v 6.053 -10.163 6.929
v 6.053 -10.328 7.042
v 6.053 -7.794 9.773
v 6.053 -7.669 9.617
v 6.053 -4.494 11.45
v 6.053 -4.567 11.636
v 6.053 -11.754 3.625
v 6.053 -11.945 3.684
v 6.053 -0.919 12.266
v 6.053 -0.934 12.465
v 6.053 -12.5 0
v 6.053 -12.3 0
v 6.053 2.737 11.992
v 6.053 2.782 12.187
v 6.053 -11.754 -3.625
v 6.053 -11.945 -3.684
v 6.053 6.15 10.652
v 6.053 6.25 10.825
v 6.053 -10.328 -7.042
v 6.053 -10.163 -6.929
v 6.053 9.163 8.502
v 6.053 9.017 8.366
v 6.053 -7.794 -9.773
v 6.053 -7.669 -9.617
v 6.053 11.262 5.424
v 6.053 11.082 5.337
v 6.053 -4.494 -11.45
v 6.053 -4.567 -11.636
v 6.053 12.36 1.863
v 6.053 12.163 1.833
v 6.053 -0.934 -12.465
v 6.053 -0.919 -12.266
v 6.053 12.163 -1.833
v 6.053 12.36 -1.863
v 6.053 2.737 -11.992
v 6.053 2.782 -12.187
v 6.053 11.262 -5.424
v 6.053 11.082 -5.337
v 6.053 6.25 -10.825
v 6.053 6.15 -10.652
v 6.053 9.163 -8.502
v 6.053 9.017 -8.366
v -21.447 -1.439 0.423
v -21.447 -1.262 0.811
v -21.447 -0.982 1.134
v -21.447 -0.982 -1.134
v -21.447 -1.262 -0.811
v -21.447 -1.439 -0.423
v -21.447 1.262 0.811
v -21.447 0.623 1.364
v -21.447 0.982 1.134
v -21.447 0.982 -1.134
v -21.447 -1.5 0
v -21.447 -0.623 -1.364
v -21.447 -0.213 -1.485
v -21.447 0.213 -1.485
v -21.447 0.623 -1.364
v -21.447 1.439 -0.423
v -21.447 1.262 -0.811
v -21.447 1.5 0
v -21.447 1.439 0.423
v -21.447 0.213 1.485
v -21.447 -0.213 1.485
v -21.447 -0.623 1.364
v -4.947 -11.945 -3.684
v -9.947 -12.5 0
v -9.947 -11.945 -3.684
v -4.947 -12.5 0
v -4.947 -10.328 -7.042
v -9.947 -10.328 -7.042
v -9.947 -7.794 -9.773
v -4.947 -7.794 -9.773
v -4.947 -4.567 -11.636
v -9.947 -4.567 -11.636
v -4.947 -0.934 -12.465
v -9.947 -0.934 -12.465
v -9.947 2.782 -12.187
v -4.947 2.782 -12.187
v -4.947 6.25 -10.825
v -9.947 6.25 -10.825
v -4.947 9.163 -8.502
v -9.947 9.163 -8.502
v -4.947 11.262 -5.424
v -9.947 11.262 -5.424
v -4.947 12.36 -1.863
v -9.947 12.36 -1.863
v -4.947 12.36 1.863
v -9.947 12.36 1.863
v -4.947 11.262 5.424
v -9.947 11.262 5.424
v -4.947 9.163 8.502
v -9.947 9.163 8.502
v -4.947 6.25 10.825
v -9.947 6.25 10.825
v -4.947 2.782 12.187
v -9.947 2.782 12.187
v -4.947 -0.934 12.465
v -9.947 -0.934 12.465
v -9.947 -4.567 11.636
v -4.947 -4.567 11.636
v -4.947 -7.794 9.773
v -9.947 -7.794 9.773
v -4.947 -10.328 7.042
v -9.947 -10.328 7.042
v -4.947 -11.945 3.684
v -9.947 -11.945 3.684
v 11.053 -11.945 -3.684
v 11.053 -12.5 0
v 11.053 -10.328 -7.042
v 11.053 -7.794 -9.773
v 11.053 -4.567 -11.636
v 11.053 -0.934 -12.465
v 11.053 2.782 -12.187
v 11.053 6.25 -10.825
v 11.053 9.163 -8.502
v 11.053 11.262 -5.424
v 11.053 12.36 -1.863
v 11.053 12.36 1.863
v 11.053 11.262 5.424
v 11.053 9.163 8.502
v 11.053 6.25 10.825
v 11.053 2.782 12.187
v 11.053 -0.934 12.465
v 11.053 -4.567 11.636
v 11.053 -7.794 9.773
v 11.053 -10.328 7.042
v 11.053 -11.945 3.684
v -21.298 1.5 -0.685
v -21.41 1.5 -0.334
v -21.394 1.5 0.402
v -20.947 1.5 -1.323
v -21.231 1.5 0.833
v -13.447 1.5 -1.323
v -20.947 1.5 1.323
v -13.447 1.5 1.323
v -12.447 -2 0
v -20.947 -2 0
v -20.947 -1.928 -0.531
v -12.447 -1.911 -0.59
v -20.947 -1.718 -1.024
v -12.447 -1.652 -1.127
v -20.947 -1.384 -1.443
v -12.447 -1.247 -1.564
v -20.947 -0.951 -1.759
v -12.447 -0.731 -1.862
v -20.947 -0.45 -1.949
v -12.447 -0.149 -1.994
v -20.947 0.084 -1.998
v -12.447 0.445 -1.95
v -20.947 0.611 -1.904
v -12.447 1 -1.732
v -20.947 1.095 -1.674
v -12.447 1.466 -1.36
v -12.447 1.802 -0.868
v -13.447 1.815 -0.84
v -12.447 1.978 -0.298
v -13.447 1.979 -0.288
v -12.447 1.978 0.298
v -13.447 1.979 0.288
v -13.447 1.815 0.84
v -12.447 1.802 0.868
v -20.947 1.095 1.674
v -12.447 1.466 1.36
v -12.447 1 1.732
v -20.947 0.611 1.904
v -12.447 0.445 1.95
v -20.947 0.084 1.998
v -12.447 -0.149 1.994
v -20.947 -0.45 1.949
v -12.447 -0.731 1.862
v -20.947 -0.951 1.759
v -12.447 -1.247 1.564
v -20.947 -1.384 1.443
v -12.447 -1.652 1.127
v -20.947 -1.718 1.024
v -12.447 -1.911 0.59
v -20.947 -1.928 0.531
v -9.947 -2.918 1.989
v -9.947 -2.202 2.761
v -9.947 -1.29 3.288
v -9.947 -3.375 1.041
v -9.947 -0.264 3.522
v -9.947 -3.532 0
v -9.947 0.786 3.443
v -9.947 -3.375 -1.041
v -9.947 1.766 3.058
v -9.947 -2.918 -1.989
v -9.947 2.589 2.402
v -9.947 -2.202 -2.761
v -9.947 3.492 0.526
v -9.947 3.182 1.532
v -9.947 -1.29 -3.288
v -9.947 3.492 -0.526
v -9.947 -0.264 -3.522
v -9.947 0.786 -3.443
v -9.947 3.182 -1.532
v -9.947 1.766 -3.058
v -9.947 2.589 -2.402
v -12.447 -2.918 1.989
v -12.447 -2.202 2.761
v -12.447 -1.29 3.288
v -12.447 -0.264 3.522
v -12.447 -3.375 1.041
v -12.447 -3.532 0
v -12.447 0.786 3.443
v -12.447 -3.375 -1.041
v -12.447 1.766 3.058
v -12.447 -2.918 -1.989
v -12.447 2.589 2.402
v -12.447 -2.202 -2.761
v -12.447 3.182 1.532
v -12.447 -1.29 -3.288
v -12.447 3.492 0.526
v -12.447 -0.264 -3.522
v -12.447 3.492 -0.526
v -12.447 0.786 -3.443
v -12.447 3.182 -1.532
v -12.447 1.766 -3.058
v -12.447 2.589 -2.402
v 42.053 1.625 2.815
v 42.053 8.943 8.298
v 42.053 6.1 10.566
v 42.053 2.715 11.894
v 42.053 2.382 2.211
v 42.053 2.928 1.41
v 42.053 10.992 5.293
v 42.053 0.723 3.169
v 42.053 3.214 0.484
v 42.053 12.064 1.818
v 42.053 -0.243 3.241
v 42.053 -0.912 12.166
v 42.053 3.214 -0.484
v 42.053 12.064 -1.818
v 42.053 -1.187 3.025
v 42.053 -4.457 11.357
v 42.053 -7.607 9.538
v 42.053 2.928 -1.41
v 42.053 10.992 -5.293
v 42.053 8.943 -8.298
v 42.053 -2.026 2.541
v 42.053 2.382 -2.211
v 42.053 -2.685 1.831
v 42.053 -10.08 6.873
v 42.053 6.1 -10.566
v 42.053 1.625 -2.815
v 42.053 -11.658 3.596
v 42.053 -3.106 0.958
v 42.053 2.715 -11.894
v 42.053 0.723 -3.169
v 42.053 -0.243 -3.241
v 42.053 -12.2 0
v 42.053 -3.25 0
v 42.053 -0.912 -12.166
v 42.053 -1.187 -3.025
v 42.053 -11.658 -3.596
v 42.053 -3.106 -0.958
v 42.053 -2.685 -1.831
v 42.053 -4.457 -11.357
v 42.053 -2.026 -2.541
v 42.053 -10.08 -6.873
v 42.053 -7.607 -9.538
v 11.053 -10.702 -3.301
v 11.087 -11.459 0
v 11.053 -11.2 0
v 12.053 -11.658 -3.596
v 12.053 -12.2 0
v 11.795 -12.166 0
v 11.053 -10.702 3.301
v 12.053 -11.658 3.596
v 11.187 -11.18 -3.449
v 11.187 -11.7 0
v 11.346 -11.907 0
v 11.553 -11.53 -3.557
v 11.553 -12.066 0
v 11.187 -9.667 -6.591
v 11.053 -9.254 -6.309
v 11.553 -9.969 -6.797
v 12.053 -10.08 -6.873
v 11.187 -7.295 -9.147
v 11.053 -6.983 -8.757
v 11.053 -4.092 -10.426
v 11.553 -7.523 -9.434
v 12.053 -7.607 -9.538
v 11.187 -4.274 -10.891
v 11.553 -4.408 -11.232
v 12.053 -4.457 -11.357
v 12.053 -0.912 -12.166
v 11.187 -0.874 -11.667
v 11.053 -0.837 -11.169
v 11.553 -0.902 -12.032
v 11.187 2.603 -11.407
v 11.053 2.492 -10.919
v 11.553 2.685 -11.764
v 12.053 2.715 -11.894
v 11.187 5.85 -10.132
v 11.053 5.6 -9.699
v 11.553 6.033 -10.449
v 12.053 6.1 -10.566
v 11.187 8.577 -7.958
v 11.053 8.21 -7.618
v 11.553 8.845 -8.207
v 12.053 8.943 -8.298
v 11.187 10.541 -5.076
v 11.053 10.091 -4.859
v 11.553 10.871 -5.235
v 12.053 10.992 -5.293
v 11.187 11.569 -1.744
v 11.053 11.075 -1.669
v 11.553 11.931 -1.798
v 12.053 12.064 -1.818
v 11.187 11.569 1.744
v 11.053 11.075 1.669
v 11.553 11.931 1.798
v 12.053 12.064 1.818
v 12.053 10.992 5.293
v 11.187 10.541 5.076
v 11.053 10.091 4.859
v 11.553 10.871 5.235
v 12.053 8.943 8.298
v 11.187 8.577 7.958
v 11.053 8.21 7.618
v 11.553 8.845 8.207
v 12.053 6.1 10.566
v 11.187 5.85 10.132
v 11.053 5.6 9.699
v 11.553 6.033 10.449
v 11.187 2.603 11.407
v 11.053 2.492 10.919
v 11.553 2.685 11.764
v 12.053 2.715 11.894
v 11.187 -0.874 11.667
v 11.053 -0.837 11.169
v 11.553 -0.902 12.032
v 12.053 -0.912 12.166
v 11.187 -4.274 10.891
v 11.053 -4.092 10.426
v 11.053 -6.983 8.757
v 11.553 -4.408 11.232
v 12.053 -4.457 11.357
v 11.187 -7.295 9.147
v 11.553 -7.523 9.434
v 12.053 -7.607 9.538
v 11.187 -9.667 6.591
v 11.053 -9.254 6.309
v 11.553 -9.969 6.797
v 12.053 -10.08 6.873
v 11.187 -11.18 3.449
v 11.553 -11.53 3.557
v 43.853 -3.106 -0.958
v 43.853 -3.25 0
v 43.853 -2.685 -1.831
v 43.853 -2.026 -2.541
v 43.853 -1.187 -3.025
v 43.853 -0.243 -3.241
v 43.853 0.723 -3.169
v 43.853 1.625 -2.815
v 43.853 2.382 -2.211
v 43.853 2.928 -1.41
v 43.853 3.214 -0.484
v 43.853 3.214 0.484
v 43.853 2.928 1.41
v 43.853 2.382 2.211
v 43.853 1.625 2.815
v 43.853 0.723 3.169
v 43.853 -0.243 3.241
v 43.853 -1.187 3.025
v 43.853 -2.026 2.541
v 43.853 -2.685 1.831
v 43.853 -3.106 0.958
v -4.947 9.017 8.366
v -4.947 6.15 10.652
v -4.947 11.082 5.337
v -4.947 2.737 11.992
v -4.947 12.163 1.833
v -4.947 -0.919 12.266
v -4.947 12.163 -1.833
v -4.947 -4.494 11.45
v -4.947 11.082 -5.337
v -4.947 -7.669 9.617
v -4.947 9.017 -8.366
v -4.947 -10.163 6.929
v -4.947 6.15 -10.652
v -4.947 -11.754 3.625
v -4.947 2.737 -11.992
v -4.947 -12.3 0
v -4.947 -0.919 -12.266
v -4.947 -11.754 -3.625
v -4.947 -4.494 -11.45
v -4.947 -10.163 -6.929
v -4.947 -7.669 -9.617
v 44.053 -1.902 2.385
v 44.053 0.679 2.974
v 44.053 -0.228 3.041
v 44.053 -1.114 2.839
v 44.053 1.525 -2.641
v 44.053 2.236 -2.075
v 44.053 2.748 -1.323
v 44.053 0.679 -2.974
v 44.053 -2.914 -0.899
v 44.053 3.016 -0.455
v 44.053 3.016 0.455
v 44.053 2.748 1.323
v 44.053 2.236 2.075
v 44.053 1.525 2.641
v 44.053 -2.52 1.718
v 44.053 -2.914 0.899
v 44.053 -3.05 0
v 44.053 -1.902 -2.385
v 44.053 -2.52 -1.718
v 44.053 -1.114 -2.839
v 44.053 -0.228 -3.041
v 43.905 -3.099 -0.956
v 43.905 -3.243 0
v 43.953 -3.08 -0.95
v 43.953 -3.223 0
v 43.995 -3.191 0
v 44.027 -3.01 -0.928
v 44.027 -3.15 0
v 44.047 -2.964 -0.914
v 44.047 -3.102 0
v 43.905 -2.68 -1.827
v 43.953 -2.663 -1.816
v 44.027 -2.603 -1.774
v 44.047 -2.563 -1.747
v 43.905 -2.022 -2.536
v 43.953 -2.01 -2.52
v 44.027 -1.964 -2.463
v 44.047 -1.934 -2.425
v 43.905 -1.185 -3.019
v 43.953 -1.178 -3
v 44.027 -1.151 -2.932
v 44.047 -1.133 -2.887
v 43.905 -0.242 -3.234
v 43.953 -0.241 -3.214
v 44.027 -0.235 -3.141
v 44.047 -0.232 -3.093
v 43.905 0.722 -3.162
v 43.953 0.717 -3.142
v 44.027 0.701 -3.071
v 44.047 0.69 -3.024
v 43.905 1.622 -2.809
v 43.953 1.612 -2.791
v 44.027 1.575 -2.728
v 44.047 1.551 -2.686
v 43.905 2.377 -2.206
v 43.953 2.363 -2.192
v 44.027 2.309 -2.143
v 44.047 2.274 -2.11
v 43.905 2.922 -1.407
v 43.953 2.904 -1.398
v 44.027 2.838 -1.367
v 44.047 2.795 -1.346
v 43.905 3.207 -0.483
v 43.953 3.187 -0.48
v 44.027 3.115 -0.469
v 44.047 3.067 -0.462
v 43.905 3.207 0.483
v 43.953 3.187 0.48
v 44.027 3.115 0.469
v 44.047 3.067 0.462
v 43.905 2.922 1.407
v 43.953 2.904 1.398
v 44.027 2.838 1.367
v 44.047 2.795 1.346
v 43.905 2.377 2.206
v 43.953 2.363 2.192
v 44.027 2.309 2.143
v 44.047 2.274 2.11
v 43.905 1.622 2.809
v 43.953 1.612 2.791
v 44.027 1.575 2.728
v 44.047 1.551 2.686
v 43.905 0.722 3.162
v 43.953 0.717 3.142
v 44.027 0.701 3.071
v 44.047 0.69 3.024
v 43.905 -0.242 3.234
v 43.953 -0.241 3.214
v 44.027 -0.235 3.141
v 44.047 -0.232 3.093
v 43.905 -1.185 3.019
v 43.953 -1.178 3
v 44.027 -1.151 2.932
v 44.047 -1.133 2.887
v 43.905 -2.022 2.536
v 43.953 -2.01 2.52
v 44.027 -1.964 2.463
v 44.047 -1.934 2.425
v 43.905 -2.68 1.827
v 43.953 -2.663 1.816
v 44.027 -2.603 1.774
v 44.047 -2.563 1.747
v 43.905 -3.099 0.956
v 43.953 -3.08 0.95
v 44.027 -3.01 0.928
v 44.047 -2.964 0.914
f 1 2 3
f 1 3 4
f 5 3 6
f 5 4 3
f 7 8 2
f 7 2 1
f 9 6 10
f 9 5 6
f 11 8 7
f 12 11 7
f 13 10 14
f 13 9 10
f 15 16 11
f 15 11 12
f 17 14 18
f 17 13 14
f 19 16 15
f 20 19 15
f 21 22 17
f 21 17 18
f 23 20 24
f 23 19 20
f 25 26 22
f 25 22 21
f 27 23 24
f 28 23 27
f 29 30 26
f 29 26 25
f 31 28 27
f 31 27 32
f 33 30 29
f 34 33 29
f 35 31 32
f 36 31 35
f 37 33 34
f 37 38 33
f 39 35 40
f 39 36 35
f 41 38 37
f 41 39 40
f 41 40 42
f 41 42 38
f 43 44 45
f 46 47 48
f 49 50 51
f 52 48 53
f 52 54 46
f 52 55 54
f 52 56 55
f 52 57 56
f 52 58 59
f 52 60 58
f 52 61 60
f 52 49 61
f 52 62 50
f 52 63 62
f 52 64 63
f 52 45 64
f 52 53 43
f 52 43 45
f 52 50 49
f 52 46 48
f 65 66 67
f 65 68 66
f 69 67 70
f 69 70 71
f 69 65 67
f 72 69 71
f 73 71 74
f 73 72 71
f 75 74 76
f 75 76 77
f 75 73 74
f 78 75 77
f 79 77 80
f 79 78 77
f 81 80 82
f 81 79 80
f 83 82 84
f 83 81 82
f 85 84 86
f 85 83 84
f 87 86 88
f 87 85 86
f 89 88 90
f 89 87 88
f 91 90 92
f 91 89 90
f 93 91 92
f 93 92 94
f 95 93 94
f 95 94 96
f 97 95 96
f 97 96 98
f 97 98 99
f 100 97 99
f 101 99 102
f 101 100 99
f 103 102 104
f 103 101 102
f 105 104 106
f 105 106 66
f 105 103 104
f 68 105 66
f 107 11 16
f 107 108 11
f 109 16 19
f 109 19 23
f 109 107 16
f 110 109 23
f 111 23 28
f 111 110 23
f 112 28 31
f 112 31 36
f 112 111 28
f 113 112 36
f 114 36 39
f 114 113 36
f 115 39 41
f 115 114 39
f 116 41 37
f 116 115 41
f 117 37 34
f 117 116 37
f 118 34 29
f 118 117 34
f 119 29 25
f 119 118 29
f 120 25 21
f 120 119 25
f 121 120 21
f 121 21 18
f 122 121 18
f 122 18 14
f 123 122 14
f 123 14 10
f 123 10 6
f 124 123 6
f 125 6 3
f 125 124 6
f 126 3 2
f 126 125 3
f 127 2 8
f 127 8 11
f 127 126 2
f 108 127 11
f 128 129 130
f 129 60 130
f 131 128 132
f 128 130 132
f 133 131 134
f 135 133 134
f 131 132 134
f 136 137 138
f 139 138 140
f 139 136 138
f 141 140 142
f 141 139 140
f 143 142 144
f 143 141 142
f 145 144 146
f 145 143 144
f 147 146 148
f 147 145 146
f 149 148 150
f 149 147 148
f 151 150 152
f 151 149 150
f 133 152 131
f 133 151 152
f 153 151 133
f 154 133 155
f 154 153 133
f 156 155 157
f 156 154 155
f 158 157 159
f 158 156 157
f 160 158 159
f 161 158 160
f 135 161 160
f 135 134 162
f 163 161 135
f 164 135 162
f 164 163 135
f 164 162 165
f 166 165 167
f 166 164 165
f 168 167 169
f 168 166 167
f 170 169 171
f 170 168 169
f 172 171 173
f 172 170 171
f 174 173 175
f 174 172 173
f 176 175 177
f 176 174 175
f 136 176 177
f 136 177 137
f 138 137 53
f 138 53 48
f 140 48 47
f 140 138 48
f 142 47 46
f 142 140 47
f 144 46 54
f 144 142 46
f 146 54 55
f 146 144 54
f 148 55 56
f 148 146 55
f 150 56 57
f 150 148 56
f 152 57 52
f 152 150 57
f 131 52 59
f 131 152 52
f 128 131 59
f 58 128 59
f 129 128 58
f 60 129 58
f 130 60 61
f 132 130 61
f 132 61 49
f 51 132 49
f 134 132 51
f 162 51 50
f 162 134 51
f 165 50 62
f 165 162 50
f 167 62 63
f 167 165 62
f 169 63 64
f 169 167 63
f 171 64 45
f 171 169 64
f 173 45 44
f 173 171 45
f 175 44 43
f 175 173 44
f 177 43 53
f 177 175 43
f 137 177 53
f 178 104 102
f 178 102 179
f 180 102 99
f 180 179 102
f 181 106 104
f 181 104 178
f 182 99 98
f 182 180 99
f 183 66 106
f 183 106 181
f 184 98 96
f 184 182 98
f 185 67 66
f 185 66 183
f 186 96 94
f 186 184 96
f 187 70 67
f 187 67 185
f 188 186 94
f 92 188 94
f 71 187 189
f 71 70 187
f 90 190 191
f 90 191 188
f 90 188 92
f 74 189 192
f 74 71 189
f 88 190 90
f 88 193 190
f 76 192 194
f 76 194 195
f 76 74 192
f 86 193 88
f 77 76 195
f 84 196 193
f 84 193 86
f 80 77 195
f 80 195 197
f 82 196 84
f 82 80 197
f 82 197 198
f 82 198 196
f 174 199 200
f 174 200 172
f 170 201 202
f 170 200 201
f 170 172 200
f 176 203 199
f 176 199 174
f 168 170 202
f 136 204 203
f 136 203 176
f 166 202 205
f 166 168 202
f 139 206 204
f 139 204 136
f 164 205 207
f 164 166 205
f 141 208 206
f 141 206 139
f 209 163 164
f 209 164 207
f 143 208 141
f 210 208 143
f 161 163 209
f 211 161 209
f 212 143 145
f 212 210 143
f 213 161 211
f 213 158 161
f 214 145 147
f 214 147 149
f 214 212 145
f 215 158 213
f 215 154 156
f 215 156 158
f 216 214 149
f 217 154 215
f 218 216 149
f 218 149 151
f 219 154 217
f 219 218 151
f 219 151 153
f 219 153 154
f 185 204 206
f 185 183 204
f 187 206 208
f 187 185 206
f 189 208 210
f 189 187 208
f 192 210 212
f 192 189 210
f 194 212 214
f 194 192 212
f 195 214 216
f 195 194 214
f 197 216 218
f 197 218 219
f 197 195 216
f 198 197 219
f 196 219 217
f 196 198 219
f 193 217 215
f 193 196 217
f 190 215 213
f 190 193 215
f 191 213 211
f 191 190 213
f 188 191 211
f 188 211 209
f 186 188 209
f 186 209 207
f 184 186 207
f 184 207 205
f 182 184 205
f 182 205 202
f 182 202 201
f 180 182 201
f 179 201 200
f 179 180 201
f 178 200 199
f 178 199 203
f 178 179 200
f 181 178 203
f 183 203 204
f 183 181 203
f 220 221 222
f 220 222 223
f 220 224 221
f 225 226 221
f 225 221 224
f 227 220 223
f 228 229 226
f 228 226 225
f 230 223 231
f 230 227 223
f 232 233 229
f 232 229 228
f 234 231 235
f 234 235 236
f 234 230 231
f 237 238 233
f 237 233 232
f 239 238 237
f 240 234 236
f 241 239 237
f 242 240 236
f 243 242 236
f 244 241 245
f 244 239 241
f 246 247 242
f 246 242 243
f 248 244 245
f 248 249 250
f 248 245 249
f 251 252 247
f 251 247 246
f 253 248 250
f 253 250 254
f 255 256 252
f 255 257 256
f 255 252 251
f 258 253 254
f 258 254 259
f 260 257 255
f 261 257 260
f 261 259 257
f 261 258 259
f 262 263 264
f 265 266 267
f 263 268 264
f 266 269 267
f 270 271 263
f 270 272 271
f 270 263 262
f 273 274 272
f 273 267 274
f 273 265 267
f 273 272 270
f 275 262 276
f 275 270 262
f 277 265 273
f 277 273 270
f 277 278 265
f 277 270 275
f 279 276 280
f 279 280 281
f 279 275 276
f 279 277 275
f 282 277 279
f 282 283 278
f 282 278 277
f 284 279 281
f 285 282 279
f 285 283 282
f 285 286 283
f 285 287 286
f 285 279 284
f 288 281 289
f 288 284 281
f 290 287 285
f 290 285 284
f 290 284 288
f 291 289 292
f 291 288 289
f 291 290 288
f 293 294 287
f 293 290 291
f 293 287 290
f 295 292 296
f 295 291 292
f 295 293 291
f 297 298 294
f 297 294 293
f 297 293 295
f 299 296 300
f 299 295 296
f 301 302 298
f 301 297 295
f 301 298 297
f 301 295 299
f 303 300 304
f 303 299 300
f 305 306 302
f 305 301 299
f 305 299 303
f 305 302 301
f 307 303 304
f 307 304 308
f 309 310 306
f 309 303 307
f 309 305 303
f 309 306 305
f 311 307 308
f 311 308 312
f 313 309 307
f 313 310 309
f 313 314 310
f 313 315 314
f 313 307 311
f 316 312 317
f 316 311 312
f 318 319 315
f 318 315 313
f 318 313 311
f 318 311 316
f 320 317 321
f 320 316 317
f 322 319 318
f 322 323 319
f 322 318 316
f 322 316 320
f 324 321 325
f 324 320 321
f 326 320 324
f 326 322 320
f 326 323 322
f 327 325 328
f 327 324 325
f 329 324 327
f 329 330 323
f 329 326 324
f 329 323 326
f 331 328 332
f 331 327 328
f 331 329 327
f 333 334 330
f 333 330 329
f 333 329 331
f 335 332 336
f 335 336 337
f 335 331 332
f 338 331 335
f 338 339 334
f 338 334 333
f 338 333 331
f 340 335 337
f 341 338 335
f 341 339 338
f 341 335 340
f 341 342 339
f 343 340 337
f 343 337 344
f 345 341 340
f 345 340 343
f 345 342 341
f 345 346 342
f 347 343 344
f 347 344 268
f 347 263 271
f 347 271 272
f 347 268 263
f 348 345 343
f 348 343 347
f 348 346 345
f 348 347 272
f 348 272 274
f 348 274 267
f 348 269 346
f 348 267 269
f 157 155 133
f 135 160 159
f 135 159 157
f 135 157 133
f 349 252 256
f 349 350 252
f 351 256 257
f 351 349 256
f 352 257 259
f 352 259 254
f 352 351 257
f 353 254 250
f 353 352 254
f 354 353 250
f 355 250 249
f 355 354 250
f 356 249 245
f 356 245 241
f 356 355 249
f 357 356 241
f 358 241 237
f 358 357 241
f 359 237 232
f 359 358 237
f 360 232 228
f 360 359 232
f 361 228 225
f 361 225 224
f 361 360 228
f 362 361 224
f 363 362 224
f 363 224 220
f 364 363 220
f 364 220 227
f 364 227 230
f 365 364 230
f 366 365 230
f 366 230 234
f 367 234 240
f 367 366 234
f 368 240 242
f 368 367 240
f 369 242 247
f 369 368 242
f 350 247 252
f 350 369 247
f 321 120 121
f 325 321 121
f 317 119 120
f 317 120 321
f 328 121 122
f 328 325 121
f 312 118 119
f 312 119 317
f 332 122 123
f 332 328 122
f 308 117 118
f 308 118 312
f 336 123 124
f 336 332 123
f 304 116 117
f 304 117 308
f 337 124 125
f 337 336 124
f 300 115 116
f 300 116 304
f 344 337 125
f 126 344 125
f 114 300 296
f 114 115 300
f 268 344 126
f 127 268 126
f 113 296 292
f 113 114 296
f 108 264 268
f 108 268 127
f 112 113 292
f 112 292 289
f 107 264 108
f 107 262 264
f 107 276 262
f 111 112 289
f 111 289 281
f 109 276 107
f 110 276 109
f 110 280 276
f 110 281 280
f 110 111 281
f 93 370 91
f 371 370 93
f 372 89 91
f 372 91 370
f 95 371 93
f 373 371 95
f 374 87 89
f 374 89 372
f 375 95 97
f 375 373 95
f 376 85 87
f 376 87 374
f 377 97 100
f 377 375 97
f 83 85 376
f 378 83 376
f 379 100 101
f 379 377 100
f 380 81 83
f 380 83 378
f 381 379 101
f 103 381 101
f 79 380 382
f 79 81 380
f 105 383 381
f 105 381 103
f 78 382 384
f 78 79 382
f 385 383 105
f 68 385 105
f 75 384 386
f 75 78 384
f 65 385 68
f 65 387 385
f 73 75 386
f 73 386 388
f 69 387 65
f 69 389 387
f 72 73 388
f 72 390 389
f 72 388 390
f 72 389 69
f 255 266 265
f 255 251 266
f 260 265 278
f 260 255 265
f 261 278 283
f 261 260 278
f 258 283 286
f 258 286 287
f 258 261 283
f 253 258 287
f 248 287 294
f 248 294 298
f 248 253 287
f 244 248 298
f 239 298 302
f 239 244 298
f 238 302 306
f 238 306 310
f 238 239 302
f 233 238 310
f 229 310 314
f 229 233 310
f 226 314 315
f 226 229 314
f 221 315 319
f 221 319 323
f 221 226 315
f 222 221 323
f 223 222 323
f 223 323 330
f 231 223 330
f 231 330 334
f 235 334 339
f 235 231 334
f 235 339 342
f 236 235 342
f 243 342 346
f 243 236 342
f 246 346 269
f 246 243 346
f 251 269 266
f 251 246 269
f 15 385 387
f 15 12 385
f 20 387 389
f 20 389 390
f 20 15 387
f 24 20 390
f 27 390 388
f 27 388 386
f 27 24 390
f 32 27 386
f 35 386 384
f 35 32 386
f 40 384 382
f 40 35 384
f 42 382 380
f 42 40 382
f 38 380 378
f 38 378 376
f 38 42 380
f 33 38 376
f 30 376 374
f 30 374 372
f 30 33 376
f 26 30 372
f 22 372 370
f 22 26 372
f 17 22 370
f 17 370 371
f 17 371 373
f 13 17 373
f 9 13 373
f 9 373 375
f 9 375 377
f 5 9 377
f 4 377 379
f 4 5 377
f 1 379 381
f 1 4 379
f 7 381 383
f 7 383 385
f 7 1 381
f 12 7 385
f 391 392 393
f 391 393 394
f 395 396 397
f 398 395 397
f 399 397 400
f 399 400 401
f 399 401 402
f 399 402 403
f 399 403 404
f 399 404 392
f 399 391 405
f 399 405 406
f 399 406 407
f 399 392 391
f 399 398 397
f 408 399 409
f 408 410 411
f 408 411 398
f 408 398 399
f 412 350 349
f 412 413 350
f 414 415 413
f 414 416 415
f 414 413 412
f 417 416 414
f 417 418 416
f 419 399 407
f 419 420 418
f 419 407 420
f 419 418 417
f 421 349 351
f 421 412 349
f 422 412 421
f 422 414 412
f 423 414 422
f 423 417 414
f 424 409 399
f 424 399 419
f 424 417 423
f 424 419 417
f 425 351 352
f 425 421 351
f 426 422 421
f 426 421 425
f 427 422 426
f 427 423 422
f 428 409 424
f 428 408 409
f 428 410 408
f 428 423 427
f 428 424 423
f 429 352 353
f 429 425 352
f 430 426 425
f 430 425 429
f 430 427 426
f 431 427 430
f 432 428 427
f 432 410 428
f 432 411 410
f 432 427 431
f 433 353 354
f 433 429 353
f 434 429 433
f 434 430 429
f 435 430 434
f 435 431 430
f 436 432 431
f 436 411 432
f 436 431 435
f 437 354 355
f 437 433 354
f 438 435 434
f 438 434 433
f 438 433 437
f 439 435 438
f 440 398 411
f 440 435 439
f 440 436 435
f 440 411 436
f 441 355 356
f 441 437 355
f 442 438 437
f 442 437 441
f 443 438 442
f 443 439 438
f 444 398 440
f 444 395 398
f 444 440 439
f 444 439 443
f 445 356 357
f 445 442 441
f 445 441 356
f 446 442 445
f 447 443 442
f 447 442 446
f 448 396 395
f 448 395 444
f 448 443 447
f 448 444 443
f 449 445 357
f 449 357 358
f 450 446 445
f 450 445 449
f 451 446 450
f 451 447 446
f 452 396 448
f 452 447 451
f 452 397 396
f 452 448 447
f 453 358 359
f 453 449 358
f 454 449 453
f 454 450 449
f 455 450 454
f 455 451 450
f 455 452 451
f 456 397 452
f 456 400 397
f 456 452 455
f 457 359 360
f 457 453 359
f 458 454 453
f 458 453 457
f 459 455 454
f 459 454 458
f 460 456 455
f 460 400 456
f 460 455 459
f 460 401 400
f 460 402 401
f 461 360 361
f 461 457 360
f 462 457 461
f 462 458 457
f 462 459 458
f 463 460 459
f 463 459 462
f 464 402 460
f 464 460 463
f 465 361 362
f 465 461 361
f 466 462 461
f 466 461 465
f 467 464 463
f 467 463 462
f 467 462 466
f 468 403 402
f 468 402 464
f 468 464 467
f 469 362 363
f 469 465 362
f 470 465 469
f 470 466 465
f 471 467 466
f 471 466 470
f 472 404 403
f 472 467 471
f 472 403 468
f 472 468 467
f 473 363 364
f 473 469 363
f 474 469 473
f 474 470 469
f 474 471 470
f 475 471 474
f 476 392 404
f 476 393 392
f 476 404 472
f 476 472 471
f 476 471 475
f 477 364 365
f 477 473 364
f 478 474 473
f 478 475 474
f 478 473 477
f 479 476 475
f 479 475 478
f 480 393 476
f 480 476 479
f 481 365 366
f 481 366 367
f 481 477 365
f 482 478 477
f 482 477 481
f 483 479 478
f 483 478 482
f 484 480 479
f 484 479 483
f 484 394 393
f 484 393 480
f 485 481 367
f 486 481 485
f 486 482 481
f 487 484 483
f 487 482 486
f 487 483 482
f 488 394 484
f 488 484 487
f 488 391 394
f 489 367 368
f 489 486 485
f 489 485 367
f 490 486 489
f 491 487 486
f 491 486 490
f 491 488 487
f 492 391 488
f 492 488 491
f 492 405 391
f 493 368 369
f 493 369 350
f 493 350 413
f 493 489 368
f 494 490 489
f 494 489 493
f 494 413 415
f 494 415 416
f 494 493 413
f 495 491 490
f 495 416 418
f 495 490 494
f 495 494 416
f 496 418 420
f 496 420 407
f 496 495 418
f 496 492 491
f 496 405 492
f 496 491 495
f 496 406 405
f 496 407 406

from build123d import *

# Parameters (mm, degrees)
CUT_EXTRUDE1_DEPTH = 8


with BuildPart() as part:
    # Sketch1 → Revolve1 (revolve)
    with BuildSketch(Plane.XY):
        with BuildLine():
            Line((-9.946660926, -3.531651516), (-9.946660926, -12.5))
            Line((-9.946660926, -12.5), (-4.946660926, -12.5))
            Line((-4.946660926, -12.5), (-4.946660926, -12.3))
            Line((-4.946660926, -12.3), (6.053339074, -12.3))
            Line((6.053339074, -12.3), (6.053339074, -12.5))
            Line((6.053339074, -12.5), (11.053339074, -12.5))
            Line((11.053339074, -12.5), (11.053339074, -11.2))
            ThreePointArc((11.053339074, -11.2), (11.346232293, -11.907106781), (12.053339074, -12.2))
            Line((12.053339074, -12.2), (42.053339074, -12.2))
            Line((42.053339074, -12.2), (42.053339074, -3.25))
            Line((42.053339074, -3.25), (43.853339074, -3.25))
            ThreePointArc((43.853339074, -3.25), (43.99476043, -3.191421356), (44.053339074, -3.05))
            Line((44.053339074, -3.05), (44.053339074, 0))
            Line((44.053339074, 0), (-21.446660926, 0))
            Line((-21.446660926, 0), (-21.446660926, -1.5))
            Line((-21.446660926, -1.5), (-20.946660926, -2))
            Line((-20.946660926, -2), (-12.446660926, -2))
            Line((-12.446660926, -2), (-12.446660926, -3.531651516))
            Line((-12.446660926, -3.531651516), (-9.946660926, -3.531651516))
        make_face()
    revolve(axis=Axis((-21.446660926, 0, 0), (1, 0, 0)))

    # Sketch2 → Cut-Extrude1 (cut)
    with BuildSketch(Plane.ZY.offset(21.446660926)):
        with BuildLine():
            Line((-1.322875656, 1.5), (1.322875656, 1.5))
            ThreePointArc((1.322875656, 1.5), (0, 2), (-1.322875656, 1.5))
        make_face()
    extrude(amount=-CUT_EXTRUDE1_DEPTH, mode=Mode.SUBTRACT)


solid = part.part
